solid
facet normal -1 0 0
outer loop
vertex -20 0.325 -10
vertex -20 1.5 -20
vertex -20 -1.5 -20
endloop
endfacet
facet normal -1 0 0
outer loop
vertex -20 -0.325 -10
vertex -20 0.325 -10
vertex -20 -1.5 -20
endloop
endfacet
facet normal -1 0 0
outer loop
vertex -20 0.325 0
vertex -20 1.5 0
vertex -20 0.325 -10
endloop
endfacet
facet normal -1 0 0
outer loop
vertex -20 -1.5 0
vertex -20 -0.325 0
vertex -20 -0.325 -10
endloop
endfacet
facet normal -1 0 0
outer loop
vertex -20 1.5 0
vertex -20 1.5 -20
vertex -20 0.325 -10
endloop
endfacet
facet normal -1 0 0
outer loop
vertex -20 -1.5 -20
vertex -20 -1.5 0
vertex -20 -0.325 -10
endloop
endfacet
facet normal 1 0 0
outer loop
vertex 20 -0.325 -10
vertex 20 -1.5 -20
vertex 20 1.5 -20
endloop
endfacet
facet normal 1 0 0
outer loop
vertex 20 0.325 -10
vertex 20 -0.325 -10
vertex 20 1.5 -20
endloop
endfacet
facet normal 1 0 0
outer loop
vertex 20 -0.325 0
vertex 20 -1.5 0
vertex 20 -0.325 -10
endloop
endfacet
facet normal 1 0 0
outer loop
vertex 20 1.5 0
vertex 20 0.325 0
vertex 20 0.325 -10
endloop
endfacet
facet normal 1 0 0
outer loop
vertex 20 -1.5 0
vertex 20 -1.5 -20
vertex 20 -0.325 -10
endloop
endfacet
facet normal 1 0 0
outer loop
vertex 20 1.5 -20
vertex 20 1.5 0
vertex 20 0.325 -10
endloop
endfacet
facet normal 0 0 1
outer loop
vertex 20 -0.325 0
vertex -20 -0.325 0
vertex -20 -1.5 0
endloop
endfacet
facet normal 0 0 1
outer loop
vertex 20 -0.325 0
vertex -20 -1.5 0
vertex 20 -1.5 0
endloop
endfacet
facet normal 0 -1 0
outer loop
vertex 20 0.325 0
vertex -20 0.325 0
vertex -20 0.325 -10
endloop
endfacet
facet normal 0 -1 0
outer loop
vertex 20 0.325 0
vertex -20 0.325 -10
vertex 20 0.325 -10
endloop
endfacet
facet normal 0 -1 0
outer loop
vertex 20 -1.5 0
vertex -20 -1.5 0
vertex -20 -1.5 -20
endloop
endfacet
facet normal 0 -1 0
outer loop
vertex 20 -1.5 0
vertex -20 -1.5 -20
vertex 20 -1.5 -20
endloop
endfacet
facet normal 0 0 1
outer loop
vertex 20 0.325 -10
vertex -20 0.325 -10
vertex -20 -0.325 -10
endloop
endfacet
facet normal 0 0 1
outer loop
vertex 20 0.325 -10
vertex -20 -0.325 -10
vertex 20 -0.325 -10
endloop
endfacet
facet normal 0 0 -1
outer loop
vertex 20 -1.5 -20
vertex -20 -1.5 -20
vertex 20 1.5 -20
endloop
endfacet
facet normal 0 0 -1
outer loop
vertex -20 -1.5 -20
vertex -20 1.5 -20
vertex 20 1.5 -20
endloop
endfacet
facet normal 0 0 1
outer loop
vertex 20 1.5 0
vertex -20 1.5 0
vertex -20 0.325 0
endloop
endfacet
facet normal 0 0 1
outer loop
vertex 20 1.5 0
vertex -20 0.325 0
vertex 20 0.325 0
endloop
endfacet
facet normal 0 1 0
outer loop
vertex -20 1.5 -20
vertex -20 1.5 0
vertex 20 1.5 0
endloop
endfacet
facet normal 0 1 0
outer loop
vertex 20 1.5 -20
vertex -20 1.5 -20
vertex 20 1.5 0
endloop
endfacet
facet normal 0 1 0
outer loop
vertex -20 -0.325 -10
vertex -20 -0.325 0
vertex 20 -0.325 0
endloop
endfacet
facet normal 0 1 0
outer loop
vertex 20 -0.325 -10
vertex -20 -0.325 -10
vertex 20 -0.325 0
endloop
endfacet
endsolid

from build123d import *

# Parameters (mm, degrees)
F0_W     = 40
F0_H     = 1.175
F0_H_2   = 0.65
F1_DEPTH = 20
F2_DEPTH = 10


with BuildPart() as f1:
    # F0 (on Top) → F1 (new body)
    with BuildSketch(Plane.XY):
        with Locations((0, -0.9125)):
            Rectangle(F0_W, F0_H)
        Rectangle(F0_W, F0_H_2)
        with Locations((0, 0.9125)):
            Rectangle(F0_W, F0_H)
    extrude(amount=-F1_DEPTH)

    # F0 (on Top) → F2 (cut)
    with BuildSketch(Plane.XY):
        Rectangle(F0_W, F0_H_2)
    extrude(amount=-F2_DEPTH, mode=Mode.SUBTRACT)


solid = f1.part
